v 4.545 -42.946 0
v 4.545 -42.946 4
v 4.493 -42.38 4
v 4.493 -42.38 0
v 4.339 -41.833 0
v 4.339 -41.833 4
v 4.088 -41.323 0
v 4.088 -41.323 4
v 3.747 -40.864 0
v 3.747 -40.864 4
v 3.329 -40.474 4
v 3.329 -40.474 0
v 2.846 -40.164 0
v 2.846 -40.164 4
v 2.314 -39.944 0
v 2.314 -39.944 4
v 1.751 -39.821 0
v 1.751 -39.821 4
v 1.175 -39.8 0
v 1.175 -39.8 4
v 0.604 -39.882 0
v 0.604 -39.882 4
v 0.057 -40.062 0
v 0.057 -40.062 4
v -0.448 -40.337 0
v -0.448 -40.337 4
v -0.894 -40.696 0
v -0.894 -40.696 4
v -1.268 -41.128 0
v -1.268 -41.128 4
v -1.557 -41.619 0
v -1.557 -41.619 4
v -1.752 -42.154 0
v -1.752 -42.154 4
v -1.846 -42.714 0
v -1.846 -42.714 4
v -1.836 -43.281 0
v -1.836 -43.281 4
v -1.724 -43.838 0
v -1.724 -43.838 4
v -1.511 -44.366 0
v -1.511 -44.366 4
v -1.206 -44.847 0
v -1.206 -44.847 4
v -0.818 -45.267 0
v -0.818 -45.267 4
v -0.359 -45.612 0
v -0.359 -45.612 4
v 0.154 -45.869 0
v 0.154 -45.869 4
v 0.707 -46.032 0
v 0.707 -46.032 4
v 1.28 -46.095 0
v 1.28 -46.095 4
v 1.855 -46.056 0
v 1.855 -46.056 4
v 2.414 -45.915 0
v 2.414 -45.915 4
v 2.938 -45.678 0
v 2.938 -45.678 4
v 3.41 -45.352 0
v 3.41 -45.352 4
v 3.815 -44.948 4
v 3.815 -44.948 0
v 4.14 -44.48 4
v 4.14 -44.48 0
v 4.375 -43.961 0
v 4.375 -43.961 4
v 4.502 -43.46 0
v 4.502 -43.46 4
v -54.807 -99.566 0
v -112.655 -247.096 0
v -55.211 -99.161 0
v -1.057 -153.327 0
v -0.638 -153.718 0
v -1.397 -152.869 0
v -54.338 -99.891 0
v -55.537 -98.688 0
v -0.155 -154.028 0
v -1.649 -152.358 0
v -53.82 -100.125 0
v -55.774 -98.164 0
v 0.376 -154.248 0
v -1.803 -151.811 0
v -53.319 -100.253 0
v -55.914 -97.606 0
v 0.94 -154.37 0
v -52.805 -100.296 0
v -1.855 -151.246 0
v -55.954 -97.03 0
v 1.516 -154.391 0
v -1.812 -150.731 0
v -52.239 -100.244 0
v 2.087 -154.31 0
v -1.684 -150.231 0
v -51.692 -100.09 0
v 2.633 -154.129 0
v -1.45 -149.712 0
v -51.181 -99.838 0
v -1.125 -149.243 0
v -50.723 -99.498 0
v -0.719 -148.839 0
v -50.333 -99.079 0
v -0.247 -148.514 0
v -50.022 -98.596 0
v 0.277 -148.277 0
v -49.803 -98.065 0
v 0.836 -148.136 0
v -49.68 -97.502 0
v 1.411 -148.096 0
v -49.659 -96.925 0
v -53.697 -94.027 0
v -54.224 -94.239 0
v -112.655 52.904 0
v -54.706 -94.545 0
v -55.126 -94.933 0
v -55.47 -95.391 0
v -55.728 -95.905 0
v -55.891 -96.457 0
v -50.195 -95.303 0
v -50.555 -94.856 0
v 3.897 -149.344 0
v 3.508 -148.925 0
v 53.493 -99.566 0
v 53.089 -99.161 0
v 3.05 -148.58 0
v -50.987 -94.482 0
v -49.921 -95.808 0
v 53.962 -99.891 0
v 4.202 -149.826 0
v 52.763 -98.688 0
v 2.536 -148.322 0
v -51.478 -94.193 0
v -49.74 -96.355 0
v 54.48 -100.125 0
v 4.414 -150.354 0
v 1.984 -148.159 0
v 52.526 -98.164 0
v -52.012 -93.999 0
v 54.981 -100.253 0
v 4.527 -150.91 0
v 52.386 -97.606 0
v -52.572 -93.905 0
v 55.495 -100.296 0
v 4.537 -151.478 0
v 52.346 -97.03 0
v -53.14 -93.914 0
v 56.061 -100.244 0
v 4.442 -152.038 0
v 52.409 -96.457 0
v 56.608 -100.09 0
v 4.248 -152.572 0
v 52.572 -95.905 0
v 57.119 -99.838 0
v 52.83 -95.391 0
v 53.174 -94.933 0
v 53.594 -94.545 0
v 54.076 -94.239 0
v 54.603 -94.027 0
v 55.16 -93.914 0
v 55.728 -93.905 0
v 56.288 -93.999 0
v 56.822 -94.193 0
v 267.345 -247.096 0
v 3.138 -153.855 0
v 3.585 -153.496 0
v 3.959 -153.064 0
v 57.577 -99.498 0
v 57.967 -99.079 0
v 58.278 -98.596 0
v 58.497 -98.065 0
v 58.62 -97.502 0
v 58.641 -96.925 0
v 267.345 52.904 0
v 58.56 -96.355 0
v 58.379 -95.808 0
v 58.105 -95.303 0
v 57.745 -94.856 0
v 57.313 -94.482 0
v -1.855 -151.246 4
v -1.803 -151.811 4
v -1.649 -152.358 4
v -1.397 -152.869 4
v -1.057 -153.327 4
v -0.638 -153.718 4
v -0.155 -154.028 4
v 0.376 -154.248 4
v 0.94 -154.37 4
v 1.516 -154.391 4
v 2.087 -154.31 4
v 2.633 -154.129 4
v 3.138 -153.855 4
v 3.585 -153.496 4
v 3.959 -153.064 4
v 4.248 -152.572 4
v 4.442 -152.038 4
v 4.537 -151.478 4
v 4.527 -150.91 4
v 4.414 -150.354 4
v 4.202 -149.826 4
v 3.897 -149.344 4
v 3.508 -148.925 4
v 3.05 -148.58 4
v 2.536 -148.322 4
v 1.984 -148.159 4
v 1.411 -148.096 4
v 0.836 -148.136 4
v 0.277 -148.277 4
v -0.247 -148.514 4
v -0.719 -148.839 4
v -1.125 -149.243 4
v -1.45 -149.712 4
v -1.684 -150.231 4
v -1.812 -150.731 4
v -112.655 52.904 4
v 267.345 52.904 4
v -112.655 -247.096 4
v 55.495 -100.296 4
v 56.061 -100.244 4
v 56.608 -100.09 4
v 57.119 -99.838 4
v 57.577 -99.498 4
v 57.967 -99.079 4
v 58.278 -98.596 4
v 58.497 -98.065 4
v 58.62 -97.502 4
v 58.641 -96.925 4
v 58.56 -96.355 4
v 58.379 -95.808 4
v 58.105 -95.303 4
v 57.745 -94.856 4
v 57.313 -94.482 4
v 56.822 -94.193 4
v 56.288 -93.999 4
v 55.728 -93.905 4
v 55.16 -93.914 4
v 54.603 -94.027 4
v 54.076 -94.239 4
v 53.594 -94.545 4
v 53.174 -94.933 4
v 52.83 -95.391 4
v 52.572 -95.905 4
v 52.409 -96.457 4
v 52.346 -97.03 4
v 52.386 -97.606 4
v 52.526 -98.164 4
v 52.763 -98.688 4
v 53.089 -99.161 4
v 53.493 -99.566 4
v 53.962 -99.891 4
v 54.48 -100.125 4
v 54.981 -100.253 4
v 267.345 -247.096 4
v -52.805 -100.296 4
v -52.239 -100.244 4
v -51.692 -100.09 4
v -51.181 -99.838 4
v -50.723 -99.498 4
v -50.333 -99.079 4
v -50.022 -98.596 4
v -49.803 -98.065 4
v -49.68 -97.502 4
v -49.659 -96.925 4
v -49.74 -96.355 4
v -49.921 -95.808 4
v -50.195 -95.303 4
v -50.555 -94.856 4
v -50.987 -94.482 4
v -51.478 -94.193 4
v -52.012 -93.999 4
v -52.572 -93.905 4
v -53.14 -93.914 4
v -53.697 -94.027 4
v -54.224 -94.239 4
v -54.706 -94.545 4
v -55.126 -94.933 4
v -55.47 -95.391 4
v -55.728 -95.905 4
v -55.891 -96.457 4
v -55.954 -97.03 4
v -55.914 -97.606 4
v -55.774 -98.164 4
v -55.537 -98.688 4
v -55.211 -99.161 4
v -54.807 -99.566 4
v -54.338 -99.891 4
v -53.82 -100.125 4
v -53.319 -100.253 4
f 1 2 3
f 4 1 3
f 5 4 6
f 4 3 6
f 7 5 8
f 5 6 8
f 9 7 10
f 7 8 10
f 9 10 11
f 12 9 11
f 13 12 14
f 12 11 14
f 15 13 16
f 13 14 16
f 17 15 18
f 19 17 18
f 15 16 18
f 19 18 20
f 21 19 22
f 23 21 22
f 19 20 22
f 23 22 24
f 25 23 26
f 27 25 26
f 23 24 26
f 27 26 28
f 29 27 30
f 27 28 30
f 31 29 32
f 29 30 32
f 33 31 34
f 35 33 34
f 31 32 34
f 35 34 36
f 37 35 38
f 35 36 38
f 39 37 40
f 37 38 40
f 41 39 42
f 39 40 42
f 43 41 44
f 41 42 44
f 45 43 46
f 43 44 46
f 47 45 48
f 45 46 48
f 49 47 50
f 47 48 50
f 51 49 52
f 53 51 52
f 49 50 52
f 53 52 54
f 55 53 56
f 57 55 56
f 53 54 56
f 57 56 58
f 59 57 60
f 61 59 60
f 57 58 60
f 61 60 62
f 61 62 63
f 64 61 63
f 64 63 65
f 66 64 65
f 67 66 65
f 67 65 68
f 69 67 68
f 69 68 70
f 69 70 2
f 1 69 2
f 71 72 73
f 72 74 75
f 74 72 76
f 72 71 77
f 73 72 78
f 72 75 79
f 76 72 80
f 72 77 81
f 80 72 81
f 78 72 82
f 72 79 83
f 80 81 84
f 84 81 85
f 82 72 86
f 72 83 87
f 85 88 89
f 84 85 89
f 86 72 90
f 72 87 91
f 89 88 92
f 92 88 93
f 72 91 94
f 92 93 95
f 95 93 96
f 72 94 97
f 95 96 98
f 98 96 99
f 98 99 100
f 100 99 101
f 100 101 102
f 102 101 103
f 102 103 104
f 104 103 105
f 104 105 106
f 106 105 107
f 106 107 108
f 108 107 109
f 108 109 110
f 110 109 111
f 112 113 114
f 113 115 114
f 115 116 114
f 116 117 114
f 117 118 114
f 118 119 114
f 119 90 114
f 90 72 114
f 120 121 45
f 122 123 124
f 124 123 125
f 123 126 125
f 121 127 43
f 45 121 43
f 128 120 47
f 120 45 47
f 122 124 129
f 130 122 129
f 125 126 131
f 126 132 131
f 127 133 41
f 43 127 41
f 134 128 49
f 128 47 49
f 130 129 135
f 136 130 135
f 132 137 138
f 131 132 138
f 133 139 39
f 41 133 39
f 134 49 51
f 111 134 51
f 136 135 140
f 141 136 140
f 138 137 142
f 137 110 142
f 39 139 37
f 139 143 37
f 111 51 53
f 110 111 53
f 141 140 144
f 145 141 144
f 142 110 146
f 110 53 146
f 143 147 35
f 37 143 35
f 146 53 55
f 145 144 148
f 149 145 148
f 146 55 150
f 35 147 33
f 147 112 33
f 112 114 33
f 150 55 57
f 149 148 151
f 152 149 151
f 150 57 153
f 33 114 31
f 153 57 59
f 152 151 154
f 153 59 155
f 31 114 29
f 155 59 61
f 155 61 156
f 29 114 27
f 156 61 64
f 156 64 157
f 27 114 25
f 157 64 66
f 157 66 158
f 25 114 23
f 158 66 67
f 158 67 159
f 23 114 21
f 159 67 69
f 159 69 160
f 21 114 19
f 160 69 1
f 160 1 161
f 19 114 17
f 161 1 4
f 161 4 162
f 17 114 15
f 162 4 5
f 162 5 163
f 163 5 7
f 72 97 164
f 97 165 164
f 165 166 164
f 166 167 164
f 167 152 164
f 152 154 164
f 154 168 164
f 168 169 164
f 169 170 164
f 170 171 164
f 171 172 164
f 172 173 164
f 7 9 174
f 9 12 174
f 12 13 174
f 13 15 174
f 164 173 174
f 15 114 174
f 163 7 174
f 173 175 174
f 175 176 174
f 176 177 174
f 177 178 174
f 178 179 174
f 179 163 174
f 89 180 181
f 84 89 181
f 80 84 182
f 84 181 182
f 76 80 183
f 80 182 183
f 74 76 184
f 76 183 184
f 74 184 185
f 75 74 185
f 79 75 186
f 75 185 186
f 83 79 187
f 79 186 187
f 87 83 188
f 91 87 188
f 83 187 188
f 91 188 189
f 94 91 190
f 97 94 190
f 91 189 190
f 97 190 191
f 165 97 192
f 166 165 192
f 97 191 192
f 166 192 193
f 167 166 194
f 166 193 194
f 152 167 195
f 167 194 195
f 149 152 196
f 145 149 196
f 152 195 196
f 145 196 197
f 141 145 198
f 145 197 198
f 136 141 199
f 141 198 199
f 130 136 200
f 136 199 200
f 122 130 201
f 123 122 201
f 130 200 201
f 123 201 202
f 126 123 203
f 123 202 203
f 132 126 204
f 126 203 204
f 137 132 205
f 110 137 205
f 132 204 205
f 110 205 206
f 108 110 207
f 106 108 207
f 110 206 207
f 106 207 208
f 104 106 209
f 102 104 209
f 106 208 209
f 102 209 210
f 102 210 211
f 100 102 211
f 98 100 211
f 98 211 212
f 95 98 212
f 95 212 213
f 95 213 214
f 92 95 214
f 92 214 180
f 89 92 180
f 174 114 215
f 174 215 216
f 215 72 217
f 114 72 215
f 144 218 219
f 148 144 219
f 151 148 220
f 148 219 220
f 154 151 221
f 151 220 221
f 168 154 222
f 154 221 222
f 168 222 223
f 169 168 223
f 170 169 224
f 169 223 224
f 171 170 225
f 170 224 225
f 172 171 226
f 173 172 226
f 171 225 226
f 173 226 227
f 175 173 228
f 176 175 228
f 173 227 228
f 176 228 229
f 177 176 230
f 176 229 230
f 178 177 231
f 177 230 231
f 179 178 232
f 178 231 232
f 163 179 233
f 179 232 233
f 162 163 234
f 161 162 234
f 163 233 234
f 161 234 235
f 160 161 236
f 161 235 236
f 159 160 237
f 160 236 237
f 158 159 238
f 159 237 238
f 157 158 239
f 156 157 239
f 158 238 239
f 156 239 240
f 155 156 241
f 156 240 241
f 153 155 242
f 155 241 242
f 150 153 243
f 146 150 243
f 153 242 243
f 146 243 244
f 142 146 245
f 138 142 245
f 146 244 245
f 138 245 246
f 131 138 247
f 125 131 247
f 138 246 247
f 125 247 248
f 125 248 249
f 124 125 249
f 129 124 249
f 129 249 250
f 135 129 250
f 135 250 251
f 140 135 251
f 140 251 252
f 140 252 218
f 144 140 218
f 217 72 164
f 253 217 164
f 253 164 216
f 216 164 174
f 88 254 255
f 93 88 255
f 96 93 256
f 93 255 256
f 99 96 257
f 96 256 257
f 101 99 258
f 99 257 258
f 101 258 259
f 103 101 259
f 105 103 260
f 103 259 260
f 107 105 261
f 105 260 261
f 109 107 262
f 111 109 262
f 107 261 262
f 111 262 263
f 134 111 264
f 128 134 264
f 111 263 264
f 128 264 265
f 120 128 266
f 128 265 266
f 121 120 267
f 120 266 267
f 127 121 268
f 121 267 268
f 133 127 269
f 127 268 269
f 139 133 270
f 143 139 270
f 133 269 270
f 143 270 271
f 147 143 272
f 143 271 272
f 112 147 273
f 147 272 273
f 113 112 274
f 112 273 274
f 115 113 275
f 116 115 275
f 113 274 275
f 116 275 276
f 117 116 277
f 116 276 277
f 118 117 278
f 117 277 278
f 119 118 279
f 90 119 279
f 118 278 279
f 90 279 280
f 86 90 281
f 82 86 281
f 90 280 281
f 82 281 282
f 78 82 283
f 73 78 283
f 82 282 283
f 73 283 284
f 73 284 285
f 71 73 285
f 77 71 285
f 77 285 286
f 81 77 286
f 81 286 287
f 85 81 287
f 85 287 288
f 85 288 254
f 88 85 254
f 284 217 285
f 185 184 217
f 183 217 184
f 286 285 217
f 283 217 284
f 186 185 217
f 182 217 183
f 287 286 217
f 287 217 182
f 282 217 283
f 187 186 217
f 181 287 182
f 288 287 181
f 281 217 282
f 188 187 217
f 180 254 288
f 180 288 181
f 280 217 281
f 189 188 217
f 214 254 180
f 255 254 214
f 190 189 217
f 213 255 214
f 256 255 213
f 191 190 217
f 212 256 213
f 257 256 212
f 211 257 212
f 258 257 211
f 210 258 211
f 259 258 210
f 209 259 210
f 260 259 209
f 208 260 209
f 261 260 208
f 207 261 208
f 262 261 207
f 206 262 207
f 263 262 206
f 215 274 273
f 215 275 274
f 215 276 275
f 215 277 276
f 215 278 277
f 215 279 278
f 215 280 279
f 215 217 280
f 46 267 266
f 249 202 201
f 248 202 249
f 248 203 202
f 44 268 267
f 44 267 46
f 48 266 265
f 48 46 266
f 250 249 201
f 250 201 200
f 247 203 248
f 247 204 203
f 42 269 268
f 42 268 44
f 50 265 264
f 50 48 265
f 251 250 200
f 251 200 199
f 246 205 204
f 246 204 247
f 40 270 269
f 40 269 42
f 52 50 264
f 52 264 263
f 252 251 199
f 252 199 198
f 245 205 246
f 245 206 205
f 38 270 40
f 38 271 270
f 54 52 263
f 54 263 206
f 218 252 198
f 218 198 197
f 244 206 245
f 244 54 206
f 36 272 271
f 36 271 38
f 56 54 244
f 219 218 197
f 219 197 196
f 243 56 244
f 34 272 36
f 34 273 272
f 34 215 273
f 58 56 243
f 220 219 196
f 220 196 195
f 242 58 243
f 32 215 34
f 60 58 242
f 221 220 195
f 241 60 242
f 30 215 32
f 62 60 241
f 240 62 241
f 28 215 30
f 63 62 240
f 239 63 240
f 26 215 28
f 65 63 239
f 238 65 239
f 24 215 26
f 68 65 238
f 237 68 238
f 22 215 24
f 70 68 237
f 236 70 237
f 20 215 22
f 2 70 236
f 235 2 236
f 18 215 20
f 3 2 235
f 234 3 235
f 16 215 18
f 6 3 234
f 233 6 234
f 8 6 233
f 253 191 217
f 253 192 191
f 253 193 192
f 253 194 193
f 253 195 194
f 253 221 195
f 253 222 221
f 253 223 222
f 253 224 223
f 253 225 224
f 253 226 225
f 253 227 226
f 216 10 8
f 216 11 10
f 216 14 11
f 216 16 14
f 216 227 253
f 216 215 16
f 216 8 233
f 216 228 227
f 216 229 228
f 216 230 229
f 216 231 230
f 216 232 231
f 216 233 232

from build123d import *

# Parameters (mm, degrees)
SKETCH1_W           = 380
SKETCH1_H           = 300
BOSS_EXTRUDE1_DEPTH = 4
SKETCH7_RX          = 3.2
SKETCH7_RY          = 3.15
CUT_EXTRUDE18_DEPTH = 4


with BuildPart() as part:
    # Sketch1 → Boss-Extrude1 (new body)
    with BuildSketch(Plane.XY):
        with Locations((77.345324037, -97.095823821)):
            Rectangle(SKETCH1_W, SKETCH1_H)
    extrude(amount=BOSS_EXTRUDE1_DEPTH)

    # Sketch7 → Cut-Extrude18 (cut)
    with BuildSketch(Plane.XY.offset(4)):
        with Locations((1.345324037, -42.945823821)):
            Ellipse(SKETCH7_RX, SKETCH7_RY)
        with Locations(Location((55.495324037, -97.095823821), (0, 0, -90))):
            Ellipse(SKETCH7_RX, SKETCH7_RY)
        with Locations(Location((1.345324037, -151.245823821), (0, 0, 180))):
            Ellipse(SKETCH7_RX, SKETCH7_RY)
        with Locations(Location((-52.804675963, -97.095823821), (0, 0, -90))):
            Ellipse(SKETCH7_RX, SKETCH7_RY)
    extrude(amount=-CUT_EXTRUDE18_DEPTH, mode=Mode.SUBTRACT)


solid = part.part
